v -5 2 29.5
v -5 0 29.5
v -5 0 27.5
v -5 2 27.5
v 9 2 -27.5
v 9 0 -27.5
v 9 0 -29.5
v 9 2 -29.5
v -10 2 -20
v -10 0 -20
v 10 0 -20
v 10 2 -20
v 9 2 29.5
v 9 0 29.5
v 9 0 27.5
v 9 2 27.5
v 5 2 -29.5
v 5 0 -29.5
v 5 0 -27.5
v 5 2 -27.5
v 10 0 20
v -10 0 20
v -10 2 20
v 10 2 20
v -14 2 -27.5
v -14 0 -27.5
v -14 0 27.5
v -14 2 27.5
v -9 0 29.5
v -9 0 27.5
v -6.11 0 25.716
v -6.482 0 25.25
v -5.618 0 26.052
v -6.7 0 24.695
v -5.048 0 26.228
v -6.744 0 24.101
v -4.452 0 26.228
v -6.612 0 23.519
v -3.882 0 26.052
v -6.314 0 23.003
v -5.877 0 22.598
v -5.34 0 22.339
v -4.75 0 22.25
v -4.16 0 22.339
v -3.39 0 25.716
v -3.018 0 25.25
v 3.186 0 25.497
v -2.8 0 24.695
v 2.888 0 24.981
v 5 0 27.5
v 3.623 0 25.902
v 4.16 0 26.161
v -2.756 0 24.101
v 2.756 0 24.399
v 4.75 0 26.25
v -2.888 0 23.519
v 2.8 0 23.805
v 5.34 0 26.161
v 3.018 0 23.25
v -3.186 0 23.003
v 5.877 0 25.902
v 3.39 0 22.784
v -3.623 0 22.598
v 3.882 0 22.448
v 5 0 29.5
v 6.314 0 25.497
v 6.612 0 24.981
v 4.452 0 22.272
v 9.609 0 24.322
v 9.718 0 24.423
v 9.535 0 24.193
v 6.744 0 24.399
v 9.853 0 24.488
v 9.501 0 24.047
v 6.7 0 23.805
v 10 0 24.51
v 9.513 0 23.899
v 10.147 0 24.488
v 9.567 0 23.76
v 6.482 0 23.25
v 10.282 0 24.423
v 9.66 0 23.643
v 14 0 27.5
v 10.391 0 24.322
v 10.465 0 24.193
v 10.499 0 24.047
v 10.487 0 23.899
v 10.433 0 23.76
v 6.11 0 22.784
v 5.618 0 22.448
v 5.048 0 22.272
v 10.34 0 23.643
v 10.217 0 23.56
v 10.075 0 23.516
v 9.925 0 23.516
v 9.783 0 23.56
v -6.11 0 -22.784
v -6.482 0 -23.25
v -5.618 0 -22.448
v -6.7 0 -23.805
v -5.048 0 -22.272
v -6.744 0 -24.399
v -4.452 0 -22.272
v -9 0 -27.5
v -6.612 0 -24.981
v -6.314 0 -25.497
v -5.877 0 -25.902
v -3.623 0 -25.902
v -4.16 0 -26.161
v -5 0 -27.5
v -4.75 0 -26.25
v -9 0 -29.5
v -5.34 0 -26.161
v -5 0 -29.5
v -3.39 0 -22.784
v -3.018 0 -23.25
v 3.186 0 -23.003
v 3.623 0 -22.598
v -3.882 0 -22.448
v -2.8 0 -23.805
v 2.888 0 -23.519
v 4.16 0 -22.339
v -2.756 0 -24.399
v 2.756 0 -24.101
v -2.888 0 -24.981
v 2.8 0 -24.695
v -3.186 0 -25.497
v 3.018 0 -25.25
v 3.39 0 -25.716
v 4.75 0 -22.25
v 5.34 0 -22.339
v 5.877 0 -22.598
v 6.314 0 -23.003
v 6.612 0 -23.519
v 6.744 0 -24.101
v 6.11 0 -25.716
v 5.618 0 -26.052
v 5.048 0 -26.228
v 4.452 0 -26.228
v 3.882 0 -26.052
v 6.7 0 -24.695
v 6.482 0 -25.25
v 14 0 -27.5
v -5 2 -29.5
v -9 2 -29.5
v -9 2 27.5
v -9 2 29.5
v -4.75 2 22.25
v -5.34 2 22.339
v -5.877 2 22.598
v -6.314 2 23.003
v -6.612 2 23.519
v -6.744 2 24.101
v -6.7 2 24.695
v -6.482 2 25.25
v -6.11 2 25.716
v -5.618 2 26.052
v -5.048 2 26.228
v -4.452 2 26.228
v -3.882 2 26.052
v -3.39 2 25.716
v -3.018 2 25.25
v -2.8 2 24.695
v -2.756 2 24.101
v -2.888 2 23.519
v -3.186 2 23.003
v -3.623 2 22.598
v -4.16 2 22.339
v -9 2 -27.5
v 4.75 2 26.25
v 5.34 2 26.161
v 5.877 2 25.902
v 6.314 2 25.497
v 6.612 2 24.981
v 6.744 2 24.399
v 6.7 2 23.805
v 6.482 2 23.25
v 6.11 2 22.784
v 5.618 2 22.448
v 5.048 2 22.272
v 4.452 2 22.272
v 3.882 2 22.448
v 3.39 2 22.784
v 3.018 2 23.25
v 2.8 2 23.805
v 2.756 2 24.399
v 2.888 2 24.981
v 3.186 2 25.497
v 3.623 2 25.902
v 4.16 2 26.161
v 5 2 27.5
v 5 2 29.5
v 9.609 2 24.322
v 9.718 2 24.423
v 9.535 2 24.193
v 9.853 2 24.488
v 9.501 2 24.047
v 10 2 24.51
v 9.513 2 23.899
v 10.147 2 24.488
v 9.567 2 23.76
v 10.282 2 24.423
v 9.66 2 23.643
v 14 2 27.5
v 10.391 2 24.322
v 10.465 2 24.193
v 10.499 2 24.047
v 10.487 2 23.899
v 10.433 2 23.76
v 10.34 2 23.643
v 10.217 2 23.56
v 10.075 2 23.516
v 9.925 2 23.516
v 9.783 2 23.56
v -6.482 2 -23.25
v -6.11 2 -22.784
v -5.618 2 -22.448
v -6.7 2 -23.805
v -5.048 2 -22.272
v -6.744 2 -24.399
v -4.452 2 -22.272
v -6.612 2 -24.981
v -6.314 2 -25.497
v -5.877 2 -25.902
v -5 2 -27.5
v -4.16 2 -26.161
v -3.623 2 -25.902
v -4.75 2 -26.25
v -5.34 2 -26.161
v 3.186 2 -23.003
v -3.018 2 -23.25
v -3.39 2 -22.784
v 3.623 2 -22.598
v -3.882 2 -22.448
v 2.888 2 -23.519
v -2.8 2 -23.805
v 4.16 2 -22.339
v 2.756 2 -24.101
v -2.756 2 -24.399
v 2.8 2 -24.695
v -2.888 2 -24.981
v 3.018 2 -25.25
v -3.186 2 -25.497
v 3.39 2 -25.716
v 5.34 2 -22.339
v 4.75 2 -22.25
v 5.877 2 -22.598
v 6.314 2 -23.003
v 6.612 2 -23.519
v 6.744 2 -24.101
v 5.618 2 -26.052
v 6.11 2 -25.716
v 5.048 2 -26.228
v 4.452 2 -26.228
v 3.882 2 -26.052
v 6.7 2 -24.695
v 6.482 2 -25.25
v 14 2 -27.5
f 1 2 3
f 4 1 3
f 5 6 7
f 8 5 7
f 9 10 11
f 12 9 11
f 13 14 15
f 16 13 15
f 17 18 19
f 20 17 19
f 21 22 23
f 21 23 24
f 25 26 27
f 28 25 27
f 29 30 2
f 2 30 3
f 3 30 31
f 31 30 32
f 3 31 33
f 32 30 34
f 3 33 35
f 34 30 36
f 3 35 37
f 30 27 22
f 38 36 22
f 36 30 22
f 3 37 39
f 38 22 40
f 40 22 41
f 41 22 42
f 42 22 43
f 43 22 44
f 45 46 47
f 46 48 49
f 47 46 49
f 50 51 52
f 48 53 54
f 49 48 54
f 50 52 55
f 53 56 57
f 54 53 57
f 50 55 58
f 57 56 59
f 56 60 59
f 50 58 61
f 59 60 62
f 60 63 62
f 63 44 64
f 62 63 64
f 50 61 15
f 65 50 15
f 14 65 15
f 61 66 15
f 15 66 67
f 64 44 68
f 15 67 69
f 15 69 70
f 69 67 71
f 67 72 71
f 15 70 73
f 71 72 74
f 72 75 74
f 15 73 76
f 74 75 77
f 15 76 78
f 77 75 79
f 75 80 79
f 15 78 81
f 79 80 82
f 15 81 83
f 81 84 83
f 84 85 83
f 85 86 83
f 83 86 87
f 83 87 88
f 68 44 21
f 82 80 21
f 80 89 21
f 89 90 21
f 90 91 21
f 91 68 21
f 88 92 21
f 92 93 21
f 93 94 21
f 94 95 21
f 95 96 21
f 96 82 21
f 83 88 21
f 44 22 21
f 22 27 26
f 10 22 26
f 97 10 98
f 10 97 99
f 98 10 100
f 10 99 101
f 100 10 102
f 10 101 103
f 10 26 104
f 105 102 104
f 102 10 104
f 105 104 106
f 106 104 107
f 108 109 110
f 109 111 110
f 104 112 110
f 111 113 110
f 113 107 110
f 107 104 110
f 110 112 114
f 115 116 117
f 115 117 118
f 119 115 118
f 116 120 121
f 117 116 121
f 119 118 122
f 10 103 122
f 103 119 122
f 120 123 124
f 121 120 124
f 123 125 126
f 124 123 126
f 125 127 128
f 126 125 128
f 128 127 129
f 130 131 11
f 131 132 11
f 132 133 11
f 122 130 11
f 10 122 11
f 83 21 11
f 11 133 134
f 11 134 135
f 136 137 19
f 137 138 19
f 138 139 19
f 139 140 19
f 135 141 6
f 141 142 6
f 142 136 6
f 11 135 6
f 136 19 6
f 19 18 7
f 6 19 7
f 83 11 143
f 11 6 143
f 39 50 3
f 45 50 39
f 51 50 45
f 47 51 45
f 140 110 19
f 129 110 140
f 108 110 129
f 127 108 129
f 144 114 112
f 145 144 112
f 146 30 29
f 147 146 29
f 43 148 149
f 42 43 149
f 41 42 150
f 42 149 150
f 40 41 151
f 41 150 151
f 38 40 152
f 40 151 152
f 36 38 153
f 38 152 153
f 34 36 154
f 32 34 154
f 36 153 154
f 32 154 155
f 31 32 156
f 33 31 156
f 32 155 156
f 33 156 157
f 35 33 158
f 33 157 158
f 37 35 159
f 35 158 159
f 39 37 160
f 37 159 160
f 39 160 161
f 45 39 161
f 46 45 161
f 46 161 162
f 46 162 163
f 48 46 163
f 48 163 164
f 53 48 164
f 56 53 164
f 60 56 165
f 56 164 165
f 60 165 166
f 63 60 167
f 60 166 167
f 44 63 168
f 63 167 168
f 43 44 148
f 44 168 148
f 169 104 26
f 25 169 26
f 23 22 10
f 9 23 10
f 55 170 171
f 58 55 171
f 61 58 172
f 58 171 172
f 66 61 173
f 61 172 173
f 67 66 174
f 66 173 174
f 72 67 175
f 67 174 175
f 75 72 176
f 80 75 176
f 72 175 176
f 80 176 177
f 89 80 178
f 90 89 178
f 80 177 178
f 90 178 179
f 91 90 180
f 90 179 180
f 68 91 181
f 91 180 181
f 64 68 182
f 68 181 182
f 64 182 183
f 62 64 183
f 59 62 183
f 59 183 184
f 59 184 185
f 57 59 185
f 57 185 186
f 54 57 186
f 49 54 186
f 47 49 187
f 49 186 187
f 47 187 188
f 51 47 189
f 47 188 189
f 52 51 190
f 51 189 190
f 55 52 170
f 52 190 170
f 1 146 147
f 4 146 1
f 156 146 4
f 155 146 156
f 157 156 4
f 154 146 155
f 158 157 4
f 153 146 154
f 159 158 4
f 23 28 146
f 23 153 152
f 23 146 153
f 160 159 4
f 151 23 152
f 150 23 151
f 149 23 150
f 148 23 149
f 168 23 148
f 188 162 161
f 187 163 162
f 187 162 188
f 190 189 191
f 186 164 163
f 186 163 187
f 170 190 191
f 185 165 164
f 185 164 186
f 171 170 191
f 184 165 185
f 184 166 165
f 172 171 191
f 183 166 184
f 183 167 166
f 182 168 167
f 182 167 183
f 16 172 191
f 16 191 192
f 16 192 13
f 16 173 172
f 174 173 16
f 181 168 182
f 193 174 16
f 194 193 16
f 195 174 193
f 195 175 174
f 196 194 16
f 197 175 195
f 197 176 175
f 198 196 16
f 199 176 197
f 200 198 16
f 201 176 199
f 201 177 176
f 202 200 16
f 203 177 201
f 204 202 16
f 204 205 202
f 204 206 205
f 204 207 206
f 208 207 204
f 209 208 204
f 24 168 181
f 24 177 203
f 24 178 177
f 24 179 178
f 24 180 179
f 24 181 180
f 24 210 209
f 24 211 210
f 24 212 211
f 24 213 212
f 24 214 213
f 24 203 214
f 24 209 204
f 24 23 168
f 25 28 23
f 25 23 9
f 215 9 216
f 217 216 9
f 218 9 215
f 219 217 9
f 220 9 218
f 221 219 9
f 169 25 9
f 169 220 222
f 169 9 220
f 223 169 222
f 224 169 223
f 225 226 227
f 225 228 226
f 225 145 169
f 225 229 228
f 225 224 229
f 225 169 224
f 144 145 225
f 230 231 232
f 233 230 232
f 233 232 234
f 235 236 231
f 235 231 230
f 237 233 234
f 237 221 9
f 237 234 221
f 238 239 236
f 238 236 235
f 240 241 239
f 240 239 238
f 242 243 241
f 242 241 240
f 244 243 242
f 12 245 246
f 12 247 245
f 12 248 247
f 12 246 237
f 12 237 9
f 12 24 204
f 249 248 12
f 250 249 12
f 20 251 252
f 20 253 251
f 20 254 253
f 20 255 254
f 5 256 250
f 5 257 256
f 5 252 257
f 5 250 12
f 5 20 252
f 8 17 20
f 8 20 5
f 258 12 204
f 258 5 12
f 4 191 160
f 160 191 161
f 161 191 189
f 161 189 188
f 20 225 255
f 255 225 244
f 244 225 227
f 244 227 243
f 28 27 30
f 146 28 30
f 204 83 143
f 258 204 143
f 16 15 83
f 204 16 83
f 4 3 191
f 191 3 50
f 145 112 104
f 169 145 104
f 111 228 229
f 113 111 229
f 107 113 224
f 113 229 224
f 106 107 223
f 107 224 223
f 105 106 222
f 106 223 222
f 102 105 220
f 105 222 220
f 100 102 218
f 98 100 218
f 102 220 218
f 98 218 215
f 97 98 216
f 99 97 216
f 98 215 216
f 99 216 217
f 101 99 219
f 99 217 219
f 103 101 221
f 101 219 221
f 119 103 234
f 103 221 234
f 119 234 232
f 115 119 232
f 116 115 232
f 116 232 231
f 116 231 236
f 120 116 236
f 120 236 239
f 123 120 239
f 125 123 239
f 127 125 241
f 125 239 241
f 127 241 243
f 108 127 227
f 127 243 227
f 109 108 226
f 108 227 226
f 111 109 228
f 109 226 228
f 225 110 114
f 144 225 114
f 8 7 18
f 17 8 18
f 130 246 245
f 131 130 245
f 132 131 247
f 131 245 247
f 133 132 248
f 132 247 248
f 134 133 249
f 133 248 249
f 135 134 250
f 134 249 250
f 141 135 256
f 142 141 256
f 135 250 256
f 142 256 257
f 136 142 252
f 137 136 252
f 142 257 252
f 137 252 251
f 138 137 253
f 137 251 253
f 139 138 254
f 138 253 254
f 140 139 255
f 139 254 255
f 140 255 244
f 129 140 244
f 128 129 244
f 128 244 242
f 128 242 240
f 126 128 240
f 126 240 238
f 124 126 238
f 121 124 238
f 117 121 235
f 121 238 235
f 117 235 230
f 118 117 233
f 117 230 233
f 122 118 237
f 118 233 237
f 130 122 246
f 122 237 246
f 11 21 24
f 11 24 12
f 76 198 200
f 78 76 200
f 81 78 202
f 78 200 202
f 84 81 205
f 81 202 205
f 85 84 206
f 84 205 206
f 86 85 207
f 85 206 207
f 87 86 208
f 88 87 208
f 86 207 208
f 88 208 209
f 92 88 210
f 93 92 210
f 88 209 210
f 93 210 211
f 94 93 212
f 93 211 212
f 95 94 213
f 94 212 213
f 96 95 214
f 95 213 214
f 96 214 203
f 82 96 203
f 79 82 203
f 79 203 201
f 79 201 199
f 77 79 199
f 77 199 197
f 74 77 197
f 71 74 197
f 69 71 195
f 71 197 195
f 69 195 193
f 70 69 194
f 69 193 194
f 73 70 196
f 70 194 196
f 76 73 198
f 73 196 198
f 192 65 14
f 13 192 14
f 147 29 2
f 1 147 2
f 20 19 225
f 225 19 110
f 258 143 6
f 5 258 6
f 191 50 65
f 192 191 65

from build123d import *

# Parameters (mm, degrees)
SKETCH1_W           = 20
SKETCH1_H           = 40
BOSS_EXTRUDE1_DEPTH = 2
SKETCH2_R           = 2
SKETCH2_R_2         = 0.5
CUT_EXTRUDE1_DEPTH  = 2


with BuildPart() as part:
    # Sketch1 → Boss-Extrude1 (new body)
    with BuildSketch(Plane(origin=(0, 0, 0), x_dir=(1, 0, 0), z_dir=(0, 1, 0))):
        Polygon((-14, -27.5), (-9, -27.5), (-9, -29.5), (-5, -29.5), (-5, -27.5), (5, -27.5), (5, -29.5), (9, -29.5), (9, -27.5), (14, -27.5), (14, 27.5), (9, 27.5), (9, 29.5), (5, 29.5), (5, 27.5), (-5, 27.5), (-5, 29.5), (-9, 29.5), (-9, 27.5), (-14, 27.5), (-14, 14.5), (-14, -14.5), align=None)
        Rectangle(SKETCH1_W, SKETCH1_H, mode=Mode.SUBTRACT)
    extrude(amount=BOSS_EXTRUDE1_DEPTH)

    # Sketch2 → Cut-Extrude1 (cut)
    with BuildSketch(Plane(origin=(0, 2, 0), x_dir=(1, 0, 0), z_dir=(0, 1, 0))):
        with Locations(Location((4.75, 24.25, 0), (0, 0, 270))):
            Circle(SKETCH2_R)
        with Locations(Location((-4.75, 24.25, 0), (0, 0, 90))):
            Circle(SKETCH2_R)
        with Locations(Location((4.75, -24.25, 0), (0, 0, 270))):
            Circle(SKETCH2_R)
        with Locations(Location((-4.75, -24.25, 0), (0, 0, 90))):
            Circle(SKETCH2_R)
        with Locations(Location((10, -24.01, 0), (0, 0, 270))):
            Circle(SKETCH2_R_2)
    extrude(amount=-CUT_EXTRUDE1_DEPTH, mode=Mode.SUBTRACT)


solid = part.part
